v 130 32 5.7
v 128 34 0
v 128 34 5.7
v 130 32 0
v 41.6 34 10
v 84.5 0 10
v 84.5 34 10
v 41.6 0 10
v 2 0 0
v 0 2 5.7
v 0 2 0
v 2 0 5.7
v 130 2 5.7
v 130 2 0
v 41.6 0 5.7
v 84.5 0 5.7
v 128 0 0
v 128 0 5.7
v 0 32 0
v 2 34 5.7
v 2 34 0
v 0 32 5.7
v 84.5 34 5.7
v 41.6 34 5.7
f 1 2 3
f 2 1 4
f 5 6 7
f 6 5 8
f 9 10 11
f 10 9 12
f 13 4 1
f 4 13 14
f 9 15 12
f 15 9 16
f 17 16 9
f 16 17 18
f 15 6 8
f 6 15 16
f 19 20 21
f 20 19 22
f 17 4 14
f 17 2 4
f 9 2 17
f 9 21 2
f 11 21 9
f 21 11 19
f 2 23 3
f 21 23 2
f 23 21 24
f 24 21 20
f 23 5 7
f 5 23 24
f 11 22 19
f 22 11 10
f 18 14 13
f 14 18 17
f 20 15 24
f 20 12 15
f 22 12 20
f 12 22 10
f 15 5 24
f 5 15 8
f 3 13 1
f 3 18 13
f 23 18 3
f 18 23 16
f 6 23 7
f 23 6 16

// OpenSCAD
$fn = 32;

// ----------------------------------------------------------------------
// Stepped bar: centerstep, 130 x 34 x 10/5.7 mm
// ----------------------------------------------------------------------

// --- parameters (mm) ---
bar_l = 130;              // bar length, X
bar_w = 34;               // bar width, Y
plate_t = 10;             // thickness of the thick zone, Z
thin_t = 5.7;             // thickness of the thin zone
corner_c = 2;             // corner chamfer of the bar
step_cut = 4.3;           // material removed from the thin zone
thick_from = 41.6;        // start of the thick middle zone
thick_to = 84.5;          // end of the thick middle zone
depth_1 = 4.3;            // depth of cut 1 from the top face
depth_2 = 4.3;            // depth of cut 2 from the top face

profile = [[2, 0], [128, 0], [130, 2], [130, 32], [128, 34], [2, 34], [0, 32], [0, 2]];  // primary outline, 8 points, counter clockwise
void_1 = [[-1, -1], [41.6, -1], [41.6, 35], [-1, 35]];  // thin left end, 4 points
void_2 = [[84.5, -1], [131, -1], [131, 35], [84.5, 35]];  // thin right end, 4 points

// --- the one profile operation ---
difference() {
  linear_extrude(height = plate_t) polygon(points = profile);
  translate([0, 0, plate_t - depth_1])
    linear_extrude(height = depth_1 + 1) polygon(points = void_1);
  translate([0, 0, plate_t - depth_2])
    linear_extrude(height = depth_2 + 1) polygon(points = void_2);
}
